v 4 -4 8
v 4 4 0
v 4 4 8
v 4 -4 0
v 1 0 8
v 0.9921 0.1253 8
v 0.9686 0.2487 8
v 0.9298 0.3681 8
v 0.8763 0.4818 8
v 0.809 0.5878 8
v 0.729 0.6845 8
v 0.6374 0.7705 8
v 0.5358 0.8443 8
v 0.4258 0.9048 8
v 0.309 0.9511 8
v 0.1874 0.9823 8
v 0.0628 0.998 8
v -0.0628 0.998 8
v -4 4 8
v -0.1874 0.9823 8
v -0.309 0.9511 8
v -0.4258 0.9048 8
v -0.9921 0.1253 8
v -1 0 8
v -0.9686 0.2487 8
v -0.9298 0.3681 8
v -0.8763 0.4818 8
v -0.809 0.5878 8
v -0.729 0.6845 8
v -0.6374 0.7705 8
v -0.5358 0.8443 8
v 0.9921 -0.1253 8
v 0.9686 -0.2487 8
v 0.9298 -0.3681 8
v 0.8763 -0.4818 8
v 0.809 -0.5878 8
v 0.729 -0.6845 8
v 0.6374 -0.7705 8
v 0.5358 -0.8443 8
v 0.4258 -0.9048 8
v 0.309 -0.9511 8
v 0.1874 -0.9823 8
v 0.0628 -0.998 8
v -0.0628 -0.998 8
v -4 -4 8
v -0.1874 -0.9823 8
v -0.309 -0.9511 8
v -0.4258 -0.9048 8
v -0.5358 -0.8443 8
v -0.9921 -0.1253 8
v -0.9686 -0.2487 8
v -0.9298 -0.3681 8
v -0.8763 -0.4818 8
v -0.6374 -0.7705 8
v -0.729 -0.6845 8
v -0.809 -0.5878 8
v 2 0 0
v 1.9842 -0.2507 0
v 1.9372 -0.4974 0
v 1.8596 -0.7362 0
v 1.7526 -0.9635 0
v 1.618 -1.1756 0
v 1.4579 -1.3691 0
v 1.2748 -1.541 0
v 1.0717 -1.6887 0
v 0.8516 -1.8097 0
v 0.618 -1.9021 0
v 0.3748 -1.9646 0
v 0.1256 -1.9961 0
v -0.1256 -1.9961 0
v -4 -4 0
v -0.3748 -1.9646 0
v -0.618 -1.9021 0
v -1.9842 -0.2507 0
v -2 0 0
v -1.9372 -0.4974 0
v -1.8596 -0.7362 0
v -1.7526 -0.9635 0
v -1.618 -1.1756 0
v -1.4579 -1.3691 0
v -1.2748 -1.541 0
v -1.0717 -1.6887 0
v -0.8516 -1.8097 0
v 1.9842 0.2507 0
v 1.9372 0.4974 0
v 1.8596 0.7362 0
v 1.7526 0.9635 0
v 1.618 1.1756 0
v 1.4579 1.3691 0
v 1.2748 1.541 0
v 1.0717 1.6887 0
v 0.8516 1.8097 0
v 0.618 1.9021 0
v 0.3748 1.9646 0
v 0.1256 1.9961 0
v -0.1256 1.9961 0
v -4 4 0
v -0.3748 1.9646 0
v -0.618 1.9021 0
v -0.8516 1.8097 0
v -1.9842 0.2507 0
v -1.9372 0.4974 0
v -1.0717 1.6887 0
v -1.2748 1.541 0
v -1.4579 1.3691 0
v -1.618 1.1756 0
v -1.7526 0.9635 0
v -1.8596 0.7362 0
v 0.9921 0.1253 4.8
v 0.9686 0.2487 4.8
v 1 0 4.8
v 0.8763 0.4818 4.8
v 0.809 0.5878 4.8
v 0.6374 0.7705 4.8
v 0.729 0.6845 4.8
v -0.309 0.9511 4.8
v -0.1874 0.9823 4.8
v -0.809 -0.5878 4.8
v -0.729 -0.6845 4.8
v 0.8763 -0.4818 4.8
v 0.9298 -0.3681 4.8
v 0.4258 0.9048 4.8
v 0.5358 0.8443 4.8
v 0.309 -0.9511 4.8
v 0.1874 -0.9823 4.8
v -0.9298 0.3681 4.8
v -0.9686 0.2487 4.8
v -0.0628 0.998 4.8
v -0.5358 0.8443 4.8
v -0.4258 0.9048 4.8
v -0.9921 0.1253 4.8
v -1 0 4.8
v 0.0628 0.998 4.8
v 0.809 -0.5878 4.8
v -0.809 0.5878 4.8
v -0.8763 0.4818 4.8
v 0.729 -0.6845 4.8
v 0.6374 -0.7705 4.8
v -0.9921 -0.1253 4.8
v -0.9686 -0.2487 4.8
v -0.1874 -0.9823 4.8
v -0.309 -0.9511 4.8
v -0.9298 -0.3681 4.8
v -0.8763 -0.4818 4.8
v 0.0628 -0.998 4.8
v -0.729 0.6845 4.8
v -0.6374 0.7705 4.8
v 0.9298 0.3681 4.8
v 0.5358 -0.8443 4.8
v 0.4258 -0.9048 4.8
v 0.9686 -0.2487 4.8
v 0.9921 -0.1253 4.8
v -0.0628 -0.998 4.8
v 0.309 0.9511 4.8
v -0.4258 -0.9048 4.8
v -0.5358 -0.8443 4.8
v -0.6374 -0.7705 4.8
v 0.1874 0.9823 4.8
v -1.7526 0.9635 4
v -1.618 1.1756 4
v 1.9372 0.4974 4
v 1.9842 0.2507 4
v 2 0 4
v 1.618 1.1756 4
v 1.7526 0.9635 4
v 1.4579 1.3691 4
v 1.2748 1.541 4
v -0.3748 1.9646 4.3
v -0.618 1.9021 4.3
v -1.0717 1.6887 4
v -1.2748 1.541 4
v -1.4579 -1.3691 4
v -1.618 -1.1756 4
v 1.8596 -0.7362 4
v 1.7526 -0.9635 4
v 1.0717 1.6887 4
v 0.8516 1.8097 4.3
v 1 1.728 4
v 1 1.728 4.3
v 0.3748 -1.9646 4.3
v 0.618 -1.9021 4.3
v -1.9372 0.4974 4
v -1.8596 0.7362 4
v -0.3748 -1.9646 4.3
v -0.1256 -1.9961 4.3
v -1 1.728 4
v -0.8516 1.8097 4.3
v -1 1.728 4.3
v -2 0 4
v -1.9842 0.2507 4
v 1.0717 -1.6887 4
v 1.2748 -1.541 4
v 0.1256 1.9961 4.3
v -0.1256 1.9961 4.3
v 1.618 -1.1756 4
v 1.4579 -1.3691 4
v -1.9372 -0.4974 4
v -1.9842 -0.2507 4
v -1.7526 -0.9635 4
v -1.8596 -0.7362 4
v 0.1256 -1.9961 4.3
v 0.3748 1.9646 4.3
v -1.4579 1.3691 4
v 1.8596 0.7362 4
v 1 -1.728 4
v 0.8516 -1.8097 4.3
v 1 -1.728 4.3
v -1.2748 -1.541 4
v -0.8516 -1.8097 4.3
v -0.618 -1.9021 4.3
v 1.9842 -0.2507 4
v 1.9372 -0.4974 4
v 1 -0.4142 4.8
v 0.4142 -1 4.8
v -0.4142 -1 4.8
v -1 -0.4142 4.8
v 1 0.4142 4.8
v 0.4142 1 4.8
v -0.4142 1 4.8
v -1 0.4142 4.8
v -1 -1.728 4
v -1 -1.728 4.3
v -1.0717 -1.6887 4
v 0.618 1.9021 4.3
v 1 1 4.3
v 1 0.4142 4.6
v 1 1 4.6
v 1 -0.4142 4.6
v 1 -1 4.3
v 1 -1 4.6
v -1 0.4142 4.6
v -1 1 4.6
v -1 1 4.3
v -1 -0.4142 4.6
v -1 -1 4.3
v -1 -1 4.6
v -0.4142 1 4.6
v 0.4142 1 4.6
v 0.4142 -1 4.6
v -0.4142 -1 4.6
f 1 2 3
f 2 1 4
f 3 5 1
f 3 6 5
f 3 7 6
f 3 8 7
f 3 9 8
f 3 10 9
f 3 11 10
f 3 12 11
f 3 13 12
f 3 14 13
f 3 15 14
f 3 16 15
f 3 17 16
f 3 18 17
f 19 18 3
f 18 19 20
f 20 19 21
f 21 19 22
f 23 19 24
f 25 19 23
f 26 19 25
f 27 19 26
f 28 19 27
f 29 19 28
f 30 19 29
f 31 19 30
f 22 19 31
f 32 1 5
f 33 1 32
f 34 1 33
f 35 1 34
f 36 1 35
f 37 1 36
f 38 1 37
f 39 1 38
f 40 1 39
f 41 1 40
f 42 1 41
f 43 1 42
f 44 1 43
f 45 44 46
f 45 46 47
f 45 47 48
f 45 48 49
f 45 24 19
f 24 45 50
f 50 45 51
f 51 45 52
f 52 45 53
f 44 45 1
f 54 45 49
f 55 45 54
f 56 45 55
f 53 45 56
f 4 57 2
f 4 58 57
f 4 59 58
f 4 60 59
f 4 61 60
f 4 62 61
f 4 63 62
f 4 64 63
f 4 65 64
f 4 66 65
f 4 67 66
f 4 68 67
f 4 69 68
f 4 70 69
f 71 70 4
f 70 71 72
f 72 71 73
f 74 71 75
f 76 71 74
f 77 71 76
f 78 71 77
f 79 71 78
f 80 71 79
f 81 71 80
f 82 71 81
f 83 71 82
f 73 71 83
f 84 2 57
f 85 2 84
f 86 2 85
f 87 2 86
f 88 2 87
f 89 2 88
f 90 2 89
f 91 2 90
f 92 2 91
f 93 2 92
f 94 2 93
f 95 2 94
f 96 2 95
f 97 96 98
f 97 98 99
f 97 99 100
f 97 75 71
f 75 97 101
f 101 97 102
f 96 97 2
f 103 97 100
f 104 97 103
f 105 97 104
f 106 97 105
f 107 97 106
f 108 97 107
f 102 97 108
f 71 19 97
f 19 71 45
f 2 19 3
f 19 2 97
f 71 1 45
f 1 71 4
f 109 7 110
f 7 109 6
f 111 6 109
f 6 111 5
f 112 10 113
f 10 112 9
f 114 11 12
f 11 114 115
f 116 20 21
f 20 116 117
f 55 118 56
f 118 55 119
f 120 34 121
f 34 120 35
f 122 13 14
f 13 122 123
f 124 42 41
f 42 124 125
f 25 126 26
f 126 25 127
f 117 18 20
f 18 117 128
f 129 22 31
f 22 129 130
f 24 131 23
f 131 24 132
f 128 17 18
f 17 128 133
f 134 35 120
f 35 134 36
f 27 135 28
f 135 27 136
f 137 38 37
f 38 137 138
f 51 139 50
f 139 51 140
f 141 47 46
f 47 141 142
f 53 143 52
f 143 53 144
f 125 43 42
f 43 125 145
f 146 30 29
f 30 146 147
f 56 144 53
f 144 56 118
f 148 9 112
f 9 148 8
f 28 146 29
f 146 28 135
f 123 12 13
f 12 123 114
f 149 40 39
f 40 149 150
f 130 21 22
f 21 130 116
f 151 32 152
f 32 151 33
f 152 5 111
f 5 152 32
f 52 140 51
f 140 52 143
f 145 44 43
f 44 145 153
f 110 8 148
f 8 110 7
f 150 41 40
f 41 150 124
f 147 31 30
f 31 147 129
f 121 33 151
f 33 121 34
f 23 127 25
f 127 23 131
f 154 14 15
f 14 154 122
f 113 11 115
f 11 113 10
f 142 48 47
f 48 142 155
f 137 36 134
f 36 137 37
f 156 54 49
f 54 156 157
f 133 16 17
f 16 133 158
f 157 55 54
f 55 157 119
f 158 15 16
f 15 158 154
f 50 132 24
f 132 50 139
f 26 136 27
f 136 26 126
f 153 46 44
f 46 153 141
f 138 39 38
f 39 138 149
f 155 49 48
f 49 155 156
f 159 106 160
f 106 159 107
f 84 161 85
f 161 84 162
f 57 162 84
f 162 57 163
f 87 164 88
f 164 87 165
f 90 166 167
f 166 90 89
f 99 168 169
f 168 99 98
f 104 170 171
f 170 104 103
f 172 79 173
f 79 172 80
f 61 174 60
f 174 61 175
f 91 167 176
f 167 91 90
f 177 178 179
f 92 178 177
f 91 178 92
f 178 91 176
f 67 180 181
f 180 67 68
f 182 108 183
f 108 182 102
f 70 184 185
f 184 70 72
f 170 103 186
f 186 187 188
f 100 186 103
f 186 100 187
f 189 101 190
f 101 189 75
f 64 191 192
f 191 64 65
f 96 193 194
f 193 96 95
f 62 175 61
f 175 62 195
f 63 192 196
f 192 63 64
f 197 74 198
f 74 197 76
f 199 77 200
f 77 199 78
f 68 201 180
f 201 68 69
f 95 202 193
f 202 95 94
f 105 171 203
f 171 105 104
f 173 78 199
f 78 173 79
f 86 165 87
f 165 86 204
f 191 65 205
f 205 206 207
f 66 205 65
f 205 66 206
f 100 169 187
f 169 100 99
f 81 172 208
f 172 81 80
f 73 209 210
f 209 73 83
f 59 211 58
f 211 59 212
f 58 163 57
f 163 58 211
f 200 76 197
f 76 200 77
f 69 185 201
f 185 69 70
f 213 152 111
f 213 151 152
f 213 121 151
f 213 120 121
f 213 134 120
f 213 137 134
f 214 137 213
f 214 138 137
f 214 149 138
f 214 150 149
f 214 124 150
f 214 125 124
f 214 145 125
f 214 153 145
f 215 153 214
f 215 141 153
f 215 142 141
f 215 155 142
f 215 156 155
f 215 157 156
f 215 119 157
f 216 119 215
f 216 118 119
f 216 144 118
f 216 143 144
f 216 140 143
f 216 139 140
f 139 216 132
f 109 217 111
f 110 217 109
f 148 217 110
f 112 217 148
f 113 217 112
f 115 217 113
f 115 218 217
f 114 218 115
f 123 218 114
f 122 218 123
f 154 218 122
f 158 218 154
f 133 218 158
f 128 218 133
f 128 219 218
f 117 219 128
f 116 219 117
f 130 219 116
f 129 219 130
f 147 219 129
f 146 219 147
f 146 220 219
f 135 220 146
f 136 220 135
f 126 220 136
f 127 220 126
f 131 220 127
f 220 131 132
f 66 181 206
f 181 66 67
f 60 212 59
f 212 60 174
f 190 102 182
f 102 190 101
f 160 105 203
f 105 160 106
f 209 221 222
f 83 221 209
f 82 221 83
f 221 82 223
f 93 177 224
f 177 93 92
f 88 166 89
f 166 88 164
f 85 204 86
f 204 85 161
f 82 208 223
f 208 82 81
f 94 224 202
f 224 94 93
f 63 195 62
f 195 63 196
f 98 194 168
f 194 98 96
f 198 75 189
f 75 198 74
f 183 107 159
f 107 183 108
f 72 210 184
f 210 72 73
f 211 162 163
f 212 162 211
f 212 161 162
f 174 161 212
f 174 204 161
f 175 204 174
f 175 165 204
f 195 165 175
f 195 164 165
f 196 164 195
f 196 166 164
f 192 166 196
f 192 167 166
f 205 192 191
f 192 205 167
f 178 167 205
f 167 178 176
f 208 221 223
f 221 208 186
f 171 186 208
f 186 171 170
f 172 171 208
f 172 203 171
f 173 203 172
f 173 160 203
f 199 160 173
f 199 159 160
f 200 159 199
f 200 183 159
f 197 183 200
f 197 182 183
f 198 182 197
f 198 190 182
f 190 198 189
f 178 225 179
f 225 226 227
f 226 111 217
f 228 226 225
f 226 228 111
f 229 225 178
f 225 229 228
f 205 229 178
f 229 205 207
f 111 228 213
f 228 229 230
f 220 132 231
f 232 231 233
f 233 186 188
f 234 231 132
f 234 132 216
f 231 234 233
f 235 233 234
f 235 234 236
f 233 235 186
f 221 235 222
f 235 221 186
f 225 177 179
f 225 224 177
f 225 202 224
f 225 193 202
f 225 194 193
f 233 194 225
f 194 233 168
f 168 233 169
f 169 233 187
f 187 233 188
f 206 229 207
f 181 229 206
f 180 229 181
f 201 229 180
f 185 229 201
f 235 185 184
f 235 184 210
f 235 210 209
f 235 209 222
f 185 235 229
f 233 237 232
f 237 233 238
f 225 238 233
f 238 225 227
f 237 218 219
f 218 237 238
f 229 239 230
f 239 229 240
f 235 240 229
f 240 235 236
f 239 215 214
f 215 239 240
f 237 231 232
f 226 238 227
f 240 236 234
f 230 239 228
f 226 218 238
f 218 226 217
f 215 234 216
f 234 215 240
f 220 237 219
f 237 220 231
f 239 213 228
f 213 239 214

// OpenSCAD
small_hole_radius = 1;
large_hole_radius = 2;
cube_side = large_hole_radius * 4;
large_hole_height = cube_side / 2;
bridge_layer_height = 0.3;

difference() {
    translate([0, 0, 4])
    cube(size=[cube_side, cube_side, cube_side], center=true);
    
    translate([0, 0, -0.1])
    cylinder(r=small_hole_radius, h=cube_side + 0.2, $fn=50);
    
    translate([0, 0, -0.1])
    cylinder(r=large_hole_radius, h=large_hole_height + bridge_layer_height * 3, $fn=50);
}

/* bridge #1 */
translate([0, 0, large_hole_height + ((bridge_layer_height * 3 + 0.1) / 2)])
difference() {
    cube(size=[large_hole_radius * 2 + 0.2, large_hole_radius * 2 + 0.2, bridge_layer_height * 3 + 0.1], center=true);
    cube(size=[small_hole_radius * 2      , large_hole_radius * 2 + 0.2, bridge_layer_height * 3 + 0.3], center=true);
}

/* bridge #2 */
translate([0, 0, large_hole_height + bridge_layer_height + ((bridge_layer_height * 2 + 0.1) / 2)])
difference() {
    cube(size=[large_hole_radius * 2 + 0.2, large_hole_radius * 2 + 0.2, bridge_layer_height * 2 + 0.1], center=true);
    cube(size=[large_hole_radius * 2 + 0.2, small_hole_radius * 2      , bridge_layer_height * 2 + 0.3], center=true);
}

/* bridge #3 */
translate([0, 0, large_hole_height + 2 * bridge_layer_height + ((bridge_layer_height + 0.1) / 2)])
rotate(v=[0, 0, 1], a=45)
difference() {
    cube(size=[large_hole_radius * 2 + 0.2, large_hole_radius * 2 + 0.2, bridge_layer_height + 0.1], center=true);
    cube(size=[small_hole_radius * 2      , small_hole_radius * 2      , bridge_layer_height + 0.3], center=true);
}
